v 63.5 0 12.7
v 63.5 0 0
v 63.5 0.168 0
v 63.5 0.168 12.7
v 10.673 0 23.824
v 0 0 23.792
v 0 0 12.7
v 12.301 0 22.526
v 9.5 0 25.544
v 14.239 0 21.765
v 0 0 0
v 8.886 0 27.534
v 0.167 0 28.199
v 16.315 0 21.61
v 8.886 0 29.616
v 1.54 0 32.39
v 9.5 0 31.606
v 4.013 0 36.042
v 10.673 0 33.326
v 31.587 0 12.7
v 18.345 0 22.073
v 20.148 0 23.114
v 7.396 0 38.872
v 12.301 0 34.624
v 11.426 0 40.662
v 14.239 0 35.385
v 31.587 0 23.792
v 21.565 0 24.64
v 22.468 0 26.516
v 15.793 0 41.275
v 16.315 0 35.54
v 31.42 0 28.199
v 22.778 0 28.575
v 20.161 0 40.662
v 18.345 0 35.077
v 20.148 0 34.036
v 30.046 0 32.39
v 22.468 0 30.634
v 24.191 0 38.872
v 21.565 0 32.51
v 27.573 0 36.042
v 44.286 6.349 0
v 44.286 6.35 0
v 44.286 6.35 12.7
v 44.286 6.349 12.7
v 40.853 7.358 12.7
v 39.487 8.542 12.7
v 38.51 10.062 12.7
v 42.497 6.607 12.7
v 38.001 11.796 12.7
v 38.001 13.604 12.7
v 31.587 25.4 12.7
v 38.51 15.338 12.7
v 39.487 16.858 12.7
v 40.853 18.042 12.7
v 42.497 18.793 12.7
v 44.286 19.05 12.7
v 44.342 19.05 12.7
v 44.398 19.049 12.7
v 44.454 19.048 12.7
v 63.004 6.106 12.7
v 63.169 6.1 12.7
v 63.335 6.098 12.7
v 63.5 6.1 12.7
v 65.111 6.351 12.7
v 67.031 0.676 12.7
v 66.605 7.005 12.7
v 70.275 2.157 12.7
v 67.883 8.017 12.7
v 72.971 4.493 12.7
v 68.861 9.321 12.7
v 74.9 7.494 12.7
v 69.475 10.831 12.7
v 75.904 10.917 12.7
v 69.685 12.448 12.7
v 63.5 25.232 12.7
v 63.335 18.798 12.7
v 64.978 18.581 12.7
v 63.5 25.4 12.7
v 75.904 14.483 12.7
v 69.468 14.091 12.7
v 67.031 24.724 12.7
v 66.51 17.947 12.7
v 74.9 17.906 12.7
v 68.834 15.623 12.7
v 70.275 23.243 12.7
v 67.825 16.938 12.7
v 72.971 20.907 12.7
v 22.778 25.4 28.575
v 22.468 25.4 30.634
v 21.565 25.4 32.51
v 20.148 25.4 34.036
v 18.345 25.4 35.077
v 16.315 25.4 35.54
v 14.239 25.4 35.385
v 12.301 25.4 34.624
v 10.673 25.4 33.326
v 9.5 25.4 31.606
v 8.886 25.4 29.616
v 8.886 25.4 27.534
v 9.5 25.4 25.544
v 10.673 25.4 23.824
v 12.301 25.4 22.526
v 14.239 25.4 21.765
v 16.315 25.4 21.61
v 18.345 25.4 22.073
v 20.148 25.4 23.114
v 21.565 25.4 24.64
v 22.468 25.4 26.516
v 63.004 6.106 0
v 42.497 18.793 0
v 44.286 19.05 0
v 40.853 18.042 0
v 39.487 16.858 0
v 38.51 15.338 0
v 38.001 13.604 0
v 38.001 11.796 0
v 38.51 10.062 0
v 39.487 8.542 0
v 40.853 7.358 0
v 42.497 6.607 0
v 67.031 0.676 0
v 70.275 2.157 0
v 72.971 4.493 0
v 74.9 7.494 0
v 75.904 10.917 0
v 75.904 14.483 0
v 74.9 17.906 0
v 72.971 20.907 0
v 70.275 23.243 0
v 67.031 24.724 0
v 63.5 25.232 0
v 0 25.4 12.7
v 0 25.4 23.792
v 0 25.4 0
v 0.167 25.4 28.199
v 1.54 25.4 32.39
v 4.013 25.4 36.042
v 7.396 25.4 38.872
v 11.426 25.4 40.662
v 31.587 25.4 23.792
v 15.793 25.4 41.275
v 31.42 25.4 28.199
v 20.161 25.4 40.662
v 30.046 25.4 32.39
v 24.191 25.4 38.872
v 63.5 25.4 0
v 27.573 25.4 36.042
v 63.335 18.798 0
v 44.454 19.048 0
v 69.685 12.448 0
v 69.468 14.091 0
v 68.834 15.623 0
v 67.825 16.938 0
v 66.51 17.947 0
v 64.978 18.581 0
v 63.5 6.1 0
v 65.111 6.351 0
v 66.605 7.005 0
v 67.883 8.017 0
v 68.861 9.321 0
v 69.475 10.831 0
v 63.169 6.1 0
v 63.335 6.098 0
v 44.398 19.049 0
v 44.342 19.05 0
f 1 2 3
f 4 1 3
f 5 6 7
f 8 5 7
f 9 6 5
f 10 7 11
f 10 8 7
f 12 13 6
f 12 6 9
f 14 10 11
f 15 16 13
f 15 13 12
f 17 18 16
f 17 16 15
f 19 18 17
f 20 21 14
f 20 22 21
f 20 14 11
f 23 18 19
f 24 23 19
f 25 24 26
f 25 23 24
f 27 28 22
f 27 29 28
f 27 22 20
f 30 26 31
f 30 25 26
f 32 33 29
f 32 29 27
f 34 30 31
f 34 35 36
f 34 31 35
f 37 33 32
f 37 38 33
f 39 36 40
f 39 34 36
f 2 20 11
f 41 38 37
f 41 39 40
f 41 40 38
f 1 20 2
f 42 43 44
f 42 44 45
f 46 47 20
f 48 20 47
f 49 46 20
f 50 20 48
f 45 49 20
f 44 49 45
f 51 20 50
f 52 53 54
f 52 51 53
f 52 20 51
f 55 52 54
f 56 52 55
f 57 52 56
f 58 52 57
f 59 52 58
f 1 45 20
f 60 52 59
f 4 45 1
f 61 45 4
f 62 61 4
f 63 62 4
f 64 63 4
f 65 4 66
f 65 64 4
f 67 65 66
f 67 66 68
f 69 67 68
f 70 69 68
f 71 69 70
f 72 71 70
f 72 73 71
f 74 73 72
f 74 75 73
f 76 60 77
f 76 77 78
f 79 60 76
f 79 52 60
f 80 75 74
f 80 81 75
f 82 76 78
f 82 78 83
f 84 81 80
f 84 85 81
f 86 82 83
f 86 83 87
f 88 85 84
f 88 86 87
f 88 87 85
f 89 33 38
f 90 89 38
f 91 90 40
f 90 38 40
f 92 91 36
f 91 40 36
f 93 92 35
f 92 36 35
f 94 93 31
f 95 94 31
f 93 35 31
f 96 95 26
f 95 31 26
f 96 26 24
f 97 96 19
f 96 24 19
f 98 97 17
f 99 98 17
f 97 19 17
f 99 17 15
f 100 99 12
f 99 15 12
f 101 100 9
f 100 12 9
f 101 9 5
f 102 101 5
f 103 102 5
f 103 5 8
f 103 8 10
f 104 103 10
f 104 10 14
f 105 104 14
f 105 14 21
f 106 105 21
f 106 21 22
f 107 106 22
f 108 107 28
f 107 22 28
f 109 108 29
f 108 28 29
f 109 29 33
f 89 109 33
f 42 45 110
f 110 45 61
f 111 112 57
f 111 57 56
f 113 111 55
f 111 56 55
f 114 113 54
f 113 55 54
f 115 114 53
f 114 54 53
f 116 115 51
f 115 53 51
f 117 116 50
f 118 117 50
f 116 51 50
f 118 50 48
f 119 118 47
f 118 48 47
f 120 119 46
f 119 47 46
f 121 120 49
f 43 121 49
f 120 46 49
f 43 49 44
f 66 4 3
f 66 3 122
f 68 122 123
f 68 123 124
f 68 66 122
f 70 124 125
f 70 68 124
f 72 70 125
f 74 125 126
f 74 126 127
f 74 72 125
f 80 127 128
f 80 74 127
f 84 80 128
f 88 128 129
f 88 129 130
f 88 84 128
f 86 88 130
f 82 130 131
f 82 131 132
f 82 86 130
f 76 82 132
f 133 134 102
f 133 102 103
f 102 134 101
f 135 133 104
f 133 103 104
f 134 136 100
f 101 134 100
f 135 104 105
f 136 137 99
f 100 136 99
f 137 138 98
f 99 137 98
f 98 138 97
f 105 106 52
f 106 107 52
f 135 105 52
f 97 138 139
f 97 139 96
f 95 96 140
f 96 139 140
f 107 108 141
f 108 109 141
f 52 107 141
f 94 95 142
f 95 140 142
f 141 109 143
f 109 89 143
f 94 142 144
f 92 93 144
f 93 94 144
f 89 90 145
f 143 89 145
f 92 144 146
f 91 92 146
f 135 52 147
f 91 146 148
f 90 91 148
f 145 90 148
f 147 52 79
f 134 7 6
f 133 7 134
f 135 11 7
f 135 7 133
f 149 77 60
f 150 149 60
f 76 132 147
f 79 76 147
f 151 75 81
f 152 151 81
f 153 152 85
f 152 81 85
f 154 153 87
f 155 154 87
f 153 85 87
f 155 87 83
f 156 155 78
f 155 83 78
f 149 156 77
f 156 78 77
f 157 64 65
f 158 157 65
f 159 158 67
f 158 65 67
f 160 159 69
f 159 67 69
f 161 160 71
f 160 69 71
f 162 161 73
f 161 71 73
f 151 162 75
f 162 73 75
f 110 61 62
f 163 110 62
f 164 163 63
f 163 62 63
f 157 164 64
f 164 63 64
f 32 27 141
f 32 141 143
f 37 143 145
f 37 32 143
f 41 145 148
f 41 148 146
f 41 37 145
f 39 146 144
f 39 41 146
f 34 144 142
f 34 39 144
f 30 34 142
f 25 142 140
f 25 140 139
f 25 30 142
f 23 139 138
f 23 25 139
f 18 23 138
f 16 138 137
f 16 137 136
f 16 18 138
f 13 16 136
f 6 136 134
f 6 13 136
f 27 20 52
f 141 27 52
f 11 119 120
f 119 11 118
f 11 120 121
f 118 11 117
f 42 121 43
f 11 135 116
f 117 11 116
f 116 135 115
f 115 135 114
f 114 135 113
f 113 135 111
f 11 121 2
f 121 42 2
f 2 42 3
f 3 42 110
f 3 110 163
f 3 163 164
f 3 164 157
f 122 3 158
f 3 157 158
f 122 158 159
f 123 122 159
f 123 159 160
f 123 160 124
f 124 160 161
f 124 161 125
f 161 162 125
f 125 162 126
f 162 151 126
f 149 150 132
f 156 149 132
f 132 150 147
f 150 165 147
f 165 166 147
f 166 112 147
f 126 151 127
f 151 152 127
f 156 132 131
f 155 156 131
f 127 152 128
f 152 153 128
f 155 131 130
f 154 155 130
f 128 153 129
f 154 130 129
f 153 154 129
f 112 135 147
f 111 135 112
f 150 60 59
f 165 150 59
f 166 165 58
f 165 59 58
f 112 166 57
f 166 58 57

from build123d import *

# Parameters (mm, degrees)
F0_W      = 63.5
F0_H      = 25.4
F1_DEPTH  = 12.7
F2_R      = 12.5320537087
F3_DEPTH  = 12.7
F5_DEPTH  = 12.7
F6_W      = 31.5867842689
F6_H      = 25.4
F7_DEPTH  = 12.7
F8_R      = 15.875
F9_DEPTH  = 25.4
F10_R     = 6.985
F11_DEPTH = 25.4


with BuildPart() as f1:
    # F0 (on Top) → F1 (new body)
    with BuildSketch(Plane.XY):
        with Locations((31.75, 12.7)):
            Rectangle(F0_W, F0_H)
    extrude(amount=F1_DEPTH)

    # F2 (on face) → F3 (join)
    with BuildSketch(Plane.XY.offset(12.7)):
        with Locations((63.5, 12.7)):
            Circle(F2_R)
    extrude(amount=-F3_DEPTH)

    # F4 (on face) → F5 (cut)
    with BuildSketch(Plane.XY.offset(12.7)):
        with BuildLine():
            ThreePointArc((63.5, 6.0999503105), (67.882802657, 8.0165452354), (69.6845581875, 12.4477947483))
            ThreePointArc((69.6845581875, 12.4477947483), (67.824686248, 16.9379228088), (63.3345581875, 18.7977947483))
            Line((63.3345581875, 18.7977947483), (63.5, 6.0999503105))
        make_face()
        with BuildLine():
            Line((63.5, 6.0999503105), (63.3345581875, 18.7977947483))
            ThreePointArc((63.3345581875, 18.7977947483), (56.9867066583, 12.6129642476), (63.0043309564, 6.1063871778))
            Line((63.0043309564, 6.1063871778), (63.5, 6.0999503105))
        make_face()
        with BuildLine():
            ThreePointArc((63.0043309564, 6.1063871778), (56.9867066583, 12.6129642476), (63.3345581875, 18.7977947483))
            Line((63.3345581875, 18.7977947483), (44.4543498473, 19.0477740161))
            ThreePointArc((44.4543498473, 19.0477740161), (48.8354076377, 17.1302891933), (50.6362277486, 12.7))
            ThreePointArc((50.6362277486, 12.7), (48.7763558091, 8.2098719395), (44.2862277486, 6.35))
            Line((44.2862277486, 6.35), (44.2862277486, 6.3494645845))
            Line((44.2862277486, 6.3494645845), (63.0043309564, 6.1063871778))
        make_face()
        with BuildLine():
            ThreePointArc((63.0043309564, 6.1063871778), (63.2521026428, 6.0983301187), (63.5, 6.0999503105))
            Line((63.5, 6.0999503105), (63.0043309564, 6.1063871778))
        make_face()
        with BuildLine():
            Line((44.2862277486, 19.05), (44.4543498473, 19.0477740161))
            ThreePointArc((44.4543498473, 19.0477740161), (44.3702961658, 19.0494434796), (44.2862277486, 19.05))
        make_face()
        with BuildLine():
            ThreePointArc((50.6362277486, 12.7), (48.8354076377, 17.1302891933), (44.4543498473, 19.0477740161))
            Line((44.4543498473, 19.0477740161), (44.2862277486, 19.05))
            Line((44.2862277486, 19.05), (44.2862277486, 6.35))
            ThreePointArc((44.2862277486, 6.35), (48.7763558091, 8.2098719395), (50.6362277486, 12.7))
        make_face()
        with BuildLine():
            Line((44.2862277486, 6.35), (44.2862277486, 19.05))
            ThreePointArc((44.2862277486, 19.05), (37.9362277486, 12.7), (44.2862277486, 6.35))
        make_face()
    extrude(amount=-F5_DEPTH, mode=Mode.SUBTRACT)

    # F6 (on face) → F7 (join)
    with BuildSketch(Plane.XY.offset(12.7)):
        with Locations((15.7933921345, 12.7)):
            Rectangle(F6_W, F6_H)
    extrude(amount=F7_DEPTH)

    # F8 (on face) → F9 (join)
    with BuildSketch(Plane.XZ):
        with Locations((15.7933921345, 25.4)):
            Circle(F8_R)
    extrude(amount=-F9_DEPTH)

    # F10 (on face) → F11 (cut)
    with BuildSketch(Plane.XZ):
        with Locations((15.7933921345, 28.575)):
            Circle(F10_R)
    extrude(amount=-F11_DEPTH, mode=Mode.SUBTRACT)


solid = f1.part
